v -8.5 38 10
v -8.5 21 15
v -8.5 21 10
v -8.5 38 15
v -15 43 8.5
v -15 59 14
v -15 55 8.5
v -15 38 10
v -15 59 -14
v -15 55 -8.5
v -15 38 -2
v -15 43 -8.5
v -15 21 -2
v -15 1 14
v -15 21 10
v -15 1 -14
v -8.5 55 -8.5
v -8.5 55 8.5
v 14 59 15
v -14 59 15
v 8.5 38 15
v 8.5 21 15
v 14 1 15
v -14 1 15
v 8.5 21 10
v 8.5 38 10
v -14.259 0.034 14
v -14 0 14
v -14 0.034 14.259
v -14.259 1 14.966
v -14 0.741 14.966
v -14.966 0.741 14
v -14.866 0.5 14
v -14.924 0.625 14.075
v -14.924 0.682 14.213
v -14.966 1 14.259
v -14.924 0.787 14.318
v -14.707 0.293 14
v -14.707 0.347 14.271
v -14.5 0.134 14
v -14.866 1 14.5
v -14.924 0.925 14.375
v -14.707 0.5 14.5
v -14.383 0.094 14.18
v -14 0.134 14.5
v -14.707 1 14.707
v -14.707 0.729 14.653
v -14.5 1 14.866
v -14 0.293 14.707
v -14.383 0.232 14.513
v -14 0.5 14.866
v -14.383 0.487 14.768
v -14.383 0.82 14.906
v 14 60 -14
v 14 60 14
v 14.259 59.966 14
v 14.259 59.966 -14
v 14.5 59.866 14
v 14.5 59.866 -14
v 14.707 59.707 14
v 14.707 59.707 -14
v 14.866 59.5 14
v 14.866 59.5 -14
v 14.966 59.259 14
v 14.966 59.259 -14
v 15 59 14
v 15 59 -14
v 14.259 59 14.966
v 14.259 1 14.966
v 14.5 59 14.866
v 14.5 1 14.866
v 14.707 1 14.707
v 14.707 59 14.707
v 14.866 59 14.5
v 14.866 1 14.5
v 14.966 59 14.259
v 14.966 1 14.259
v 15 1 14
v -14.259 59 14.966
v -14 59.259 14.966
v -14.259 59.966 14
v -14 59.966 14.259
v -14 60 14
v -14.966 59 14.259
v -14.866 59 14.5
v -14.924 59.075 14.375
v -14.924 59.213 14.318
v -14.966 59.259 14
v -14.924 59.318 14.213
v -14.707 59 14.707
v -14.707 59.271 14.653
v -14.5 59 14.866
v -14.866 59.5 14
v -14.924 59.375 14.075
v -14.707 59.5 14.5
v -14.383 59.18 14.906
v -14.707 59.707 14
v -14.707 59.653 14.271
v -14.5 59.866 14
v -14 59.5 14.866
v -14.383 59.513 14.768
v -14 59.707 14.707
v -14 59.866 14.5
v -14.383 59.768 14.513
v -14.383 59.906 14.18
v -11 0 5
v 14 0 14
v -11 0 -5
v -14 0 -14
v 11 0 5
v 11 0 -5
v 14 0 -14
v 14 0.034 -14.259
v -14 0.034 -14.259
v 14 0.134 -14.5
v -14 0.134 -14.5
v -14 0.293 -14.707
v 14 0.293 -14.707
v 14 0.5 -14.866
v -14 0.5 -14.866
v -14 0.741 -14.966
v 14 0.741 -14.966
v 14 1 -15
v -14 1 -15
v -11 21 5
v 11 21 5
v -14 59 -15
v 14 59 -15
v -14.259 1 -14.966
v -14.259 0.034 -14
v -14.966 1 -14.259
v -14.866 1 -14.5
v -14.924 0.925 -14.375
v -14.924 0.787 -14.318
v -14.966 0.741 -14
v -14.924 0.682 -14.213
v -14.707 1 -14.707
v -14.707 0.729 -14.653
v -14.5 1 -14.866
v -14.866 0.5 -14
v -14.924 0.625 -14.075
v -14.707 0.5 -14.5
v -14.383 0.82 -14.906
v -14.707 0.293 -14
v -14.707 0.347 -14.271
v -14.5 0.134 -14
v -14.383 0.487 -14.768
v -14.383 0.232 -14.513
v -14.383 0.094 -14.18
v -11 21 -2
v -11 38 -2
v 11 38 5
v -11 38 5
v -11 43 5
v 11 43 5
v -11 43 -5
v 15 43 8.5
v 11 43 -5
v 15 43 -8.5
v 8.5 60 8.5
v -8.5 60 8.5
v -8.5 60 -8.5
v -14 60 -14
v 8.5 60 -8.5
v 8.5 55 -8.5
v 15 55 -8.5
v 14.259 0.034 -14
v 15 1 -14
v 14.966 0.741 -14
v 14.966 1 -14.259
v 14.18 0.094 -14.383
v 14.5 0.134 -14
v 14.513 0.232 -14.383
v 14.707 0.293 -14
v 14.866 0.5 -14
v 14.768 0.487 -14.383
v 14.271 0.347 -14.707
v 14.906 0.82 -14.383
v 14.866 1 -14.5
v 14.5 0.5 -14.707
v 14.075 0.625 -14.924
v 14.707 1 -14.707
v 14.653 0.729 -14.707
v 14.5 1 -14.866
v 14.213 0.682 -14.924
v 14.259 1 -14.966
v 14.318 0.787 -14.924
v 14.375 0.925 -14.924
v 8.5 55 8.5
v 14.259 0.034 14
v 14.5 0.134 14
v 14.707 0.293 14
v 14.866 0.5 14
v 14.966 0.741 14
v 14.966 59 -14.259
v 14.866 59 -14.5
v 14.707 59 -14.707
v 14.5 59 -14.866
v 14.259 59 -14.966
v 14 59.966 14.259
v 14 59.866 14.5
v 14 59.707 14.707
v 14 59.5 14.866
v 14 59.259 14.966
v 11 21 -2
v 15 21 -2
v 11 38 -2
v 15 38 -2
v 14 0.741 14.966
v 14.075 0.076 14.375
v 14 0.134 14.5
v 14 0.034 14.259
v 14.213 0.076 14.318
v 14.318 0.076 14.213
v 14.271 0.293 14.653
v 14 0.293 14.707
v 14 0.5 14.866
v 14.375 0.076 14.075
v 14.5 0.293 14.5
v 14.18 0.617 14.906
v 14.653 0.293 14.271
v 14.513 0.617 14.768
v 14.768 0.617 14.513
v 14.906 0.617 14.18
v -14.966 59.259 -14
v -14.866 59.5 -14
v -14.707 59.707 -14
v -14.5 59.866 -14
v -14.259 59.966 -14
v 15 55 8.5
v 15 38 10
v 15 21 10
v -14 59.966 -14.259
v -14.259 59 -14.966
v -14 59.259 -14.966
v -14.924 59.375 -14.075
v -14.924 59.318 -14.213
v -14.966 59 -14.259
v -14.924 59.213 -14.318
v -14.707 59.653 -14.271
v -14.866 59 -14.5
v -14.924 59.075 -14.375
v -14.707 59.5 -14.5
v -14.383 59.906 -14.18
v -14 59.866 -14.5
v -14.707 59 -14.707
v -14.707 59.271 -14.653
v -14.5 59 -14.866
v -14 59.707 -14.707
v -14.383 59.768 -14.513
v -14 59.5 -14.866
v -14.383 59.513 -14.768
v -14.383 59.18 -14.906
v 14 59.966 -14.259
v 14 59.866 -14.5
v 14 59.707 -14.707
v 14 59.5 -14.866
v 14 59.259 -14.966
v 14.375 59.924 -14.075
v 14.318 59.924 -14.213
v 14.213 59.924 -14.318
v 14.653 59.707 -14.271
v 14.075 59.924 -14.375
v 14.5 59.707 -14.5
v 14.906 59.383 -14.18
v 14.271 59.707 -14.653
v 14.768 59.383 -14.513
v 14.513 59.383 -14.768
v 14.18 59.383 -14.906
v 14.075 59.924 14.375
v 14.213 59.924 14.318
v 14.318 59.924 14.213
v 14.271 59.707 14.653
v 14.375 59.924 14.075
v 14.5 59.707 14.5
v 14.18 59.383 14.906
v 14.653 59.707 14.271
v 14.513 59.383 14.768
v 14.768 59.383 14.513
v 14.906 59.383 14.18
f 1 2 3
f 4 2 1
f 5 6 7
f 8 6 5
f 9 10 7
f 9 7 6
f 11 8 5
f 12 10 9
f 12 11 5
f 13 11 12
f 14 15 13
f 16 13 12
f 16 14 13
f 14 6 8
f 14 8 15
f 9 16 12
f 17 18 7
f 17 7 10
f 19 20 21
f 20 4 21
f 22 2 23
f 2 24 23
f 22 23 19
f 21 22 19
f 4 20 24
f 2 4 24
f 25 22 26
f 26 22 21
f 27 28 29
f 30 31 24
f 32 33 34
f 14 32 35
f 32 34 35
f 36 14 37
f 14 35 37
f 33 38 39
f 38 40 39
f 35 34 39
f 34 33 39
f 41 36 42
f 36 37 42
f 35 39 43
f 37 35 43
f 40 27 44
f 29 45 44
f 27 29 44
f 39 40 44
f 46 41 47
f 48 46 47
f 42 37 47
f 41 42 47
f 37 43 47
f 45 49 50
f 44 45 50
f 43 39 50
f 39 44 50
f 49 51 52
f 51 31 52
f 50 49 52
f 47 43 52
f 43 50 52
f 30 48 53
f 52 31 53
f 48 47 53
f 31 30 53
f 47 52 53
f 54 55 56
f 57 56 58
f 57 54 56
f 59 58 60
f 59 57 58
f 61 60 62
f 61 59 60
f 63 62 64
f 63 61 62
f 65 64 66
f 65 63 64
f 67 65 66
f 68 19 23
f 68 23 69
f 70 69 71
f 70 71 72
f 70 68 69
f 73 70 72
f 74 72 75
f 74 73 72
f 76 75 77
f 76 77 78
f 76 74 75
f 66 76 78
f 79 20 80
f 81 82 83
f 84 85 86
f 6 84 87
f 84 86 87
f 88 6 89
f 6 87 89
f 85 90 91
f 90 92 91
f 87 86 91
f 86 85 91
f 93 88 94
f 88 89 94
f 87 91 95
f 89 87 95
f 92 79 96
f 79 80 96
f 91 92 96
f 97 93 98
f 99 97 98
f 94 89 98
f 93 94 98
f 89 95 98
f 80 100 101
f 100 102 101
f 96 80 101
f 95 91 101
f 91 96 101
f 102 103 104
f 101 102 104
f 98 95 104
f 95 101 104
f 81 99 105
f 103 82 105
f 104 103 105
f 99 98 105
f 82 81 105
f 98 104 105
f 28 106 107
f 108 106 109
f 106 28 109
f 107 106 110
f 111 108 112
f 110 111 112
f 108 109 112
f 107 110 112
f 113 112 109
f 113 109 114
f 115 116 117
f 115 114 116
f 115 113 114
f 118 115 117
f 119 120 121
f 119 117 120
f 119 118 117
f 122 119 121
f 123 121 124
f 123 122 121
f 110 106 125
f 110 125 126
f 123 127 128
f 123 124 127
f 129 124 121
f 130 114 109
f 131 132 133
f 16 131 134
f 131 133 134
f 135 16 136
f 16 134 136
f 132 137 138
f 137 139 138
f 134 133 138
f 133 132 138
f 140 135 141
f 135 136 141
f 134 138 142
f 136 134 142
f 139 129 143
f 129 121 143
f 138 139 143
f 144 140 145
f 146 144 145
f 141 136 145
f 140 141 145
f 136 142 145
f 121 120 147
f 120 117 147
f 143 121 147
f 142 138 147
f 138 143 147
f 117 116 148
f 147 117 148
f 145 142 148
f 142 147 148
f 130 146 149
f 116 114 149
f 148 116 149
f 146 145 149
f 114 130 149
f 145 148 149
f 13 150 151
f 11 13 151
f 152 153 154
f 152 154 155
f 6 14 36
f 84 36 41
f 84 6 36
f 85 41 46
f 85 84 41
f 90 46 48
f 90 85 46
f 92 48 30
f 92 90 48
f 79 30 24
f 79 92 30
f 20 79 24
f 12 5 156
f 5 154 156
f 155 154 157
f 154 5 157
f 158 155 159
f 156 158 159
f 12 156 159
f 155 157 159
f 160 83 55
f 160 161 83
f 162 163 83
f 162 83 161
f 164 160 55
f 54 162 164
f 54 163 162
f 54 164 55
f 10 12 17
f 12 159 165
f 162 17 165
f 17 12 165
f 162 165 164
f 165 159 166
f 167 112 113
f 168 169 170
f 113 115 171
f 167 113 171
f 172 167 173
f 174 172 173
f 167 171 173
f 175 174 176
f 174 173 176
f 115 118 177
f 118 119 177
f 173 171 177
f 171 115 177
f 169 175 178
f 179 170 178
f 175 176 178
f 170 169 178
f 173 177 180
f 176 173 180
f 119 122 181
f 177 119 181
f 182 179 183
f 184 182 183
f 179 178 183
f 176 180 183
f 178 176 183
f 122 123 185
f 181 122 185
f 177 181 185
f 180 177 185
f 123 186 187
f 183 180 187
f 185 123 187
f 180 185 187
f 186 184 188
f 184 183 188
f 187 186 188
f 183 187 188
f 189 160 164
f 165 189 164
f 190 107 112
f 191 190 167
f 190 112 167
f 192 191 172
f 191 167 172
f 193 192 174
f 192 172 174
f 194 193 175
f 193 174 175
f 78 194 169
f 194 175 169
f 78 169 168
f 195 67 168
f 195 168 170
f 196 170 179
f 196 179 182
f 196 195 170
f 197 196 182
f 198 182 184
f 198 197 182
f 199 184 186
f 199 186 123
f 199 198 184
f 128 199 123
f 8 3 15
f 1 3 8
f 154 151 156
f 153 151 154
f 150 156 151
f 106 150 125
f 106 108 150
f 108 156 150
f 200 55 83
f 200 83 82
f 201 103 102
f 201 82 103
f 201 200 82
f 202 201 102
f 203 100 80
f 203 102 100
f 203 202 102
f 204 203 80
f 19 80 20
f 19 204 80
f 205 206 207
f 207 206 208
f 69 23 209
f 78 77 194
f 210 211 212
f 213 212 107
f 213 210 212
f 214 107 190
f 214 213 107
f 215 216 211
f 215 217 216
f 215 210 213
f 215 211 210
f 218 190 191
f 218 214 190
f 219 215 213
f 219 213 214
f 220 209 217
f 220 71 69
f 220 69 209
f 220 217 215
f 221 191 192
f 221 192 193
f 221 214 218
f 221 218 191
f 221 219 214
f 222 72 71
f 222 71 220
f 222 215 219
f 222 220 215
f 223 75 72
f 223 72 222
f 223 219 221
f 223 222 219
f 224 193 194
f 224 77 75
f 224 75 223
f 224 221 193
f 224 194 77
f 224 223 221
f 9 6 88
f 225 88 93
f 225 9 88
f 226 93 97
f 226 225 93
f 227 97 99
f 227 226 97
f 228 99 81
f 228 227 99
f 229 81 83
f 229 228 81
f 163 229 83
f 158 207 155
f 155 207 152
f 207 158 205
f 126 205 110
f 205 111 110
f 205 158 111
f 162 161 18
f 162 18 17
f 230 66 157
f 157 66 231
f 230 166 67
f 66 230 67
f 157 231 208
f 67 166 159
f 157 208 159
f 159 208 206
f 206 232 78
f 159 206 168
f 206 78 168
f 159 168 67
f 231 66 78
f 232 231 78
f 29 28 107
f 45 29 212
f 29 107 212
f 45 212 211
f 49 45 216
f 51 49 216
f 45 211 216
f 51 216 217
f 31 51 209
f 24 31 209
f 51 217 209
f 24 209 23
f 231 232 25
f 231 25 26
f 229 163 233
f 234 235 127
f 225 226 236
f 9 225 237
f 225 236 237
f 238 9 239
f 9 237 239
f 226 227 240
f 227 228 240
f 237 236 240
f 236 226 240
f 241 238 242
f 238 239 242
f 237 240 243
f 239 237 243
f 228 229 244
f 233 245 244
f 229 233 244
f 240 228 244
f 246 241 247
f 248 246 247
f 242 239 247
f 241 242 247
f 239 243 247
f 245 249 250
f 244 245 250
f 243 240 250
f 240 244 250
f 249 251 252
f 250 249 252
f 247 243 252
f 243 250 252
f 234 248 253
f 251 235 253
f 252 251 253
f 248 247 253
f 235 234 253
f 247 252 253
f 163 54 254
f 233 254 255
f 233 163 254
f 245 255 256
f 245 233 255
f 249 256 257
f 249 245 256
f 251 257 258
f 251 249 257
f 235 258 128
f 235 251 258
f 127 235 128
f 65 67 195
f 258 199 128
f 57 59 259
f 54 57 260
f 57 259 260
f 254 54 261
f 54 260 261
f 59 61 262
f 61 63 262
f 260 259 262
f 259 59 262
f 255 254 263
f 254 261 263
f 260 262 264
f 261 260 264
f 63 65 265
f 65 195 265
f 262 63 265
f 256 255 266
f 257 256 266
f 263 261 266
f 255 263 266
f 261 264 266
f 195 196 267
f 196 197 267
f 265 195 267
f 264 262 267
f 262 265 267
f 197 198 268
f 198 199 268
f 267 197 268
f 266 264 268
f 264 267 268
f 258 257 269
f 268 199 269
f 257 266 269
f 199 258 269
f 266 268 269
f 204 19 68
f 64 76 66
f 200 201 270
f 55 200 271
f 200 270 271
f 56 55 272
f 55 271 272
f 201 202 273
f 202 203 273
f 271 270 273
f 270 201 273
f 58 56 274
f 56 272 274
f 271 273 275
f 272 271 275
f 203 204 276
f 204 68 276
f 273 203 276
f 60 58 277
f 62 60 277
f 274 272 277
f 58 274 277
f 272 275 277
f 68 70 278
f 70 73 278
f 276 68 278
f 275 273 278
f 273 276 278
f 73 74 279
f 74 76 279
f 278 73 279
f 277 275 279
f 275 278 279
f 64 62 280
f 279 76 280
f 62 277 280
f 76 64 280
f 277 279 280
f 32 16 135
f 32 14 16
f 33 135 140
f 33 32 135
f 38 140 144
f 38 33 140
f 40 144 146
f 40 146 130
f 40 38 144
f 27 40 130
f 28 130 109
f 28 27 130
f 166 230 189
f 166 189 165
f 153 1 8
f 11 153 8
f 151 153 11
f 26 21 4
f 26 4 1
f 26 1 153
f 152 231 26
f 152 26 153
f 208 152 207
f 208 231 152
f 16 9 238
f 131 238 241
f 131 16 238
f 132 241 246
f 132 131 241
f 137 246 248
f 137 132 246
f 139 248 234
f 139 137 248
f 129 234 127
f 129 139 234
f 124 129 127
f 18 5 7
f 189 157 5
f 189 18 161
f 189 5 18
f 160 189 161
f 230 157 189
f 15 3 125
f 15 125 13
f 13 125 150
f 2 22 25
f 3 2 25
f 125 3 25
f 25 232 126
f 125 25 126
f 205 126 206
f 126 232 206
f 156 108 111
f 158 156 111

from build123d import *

# Parameters (mm, degrees)
SKETCH_1_W          = 30
SKETCH_1_H          = 30
EXTRUDE_2_DEPTH     = 60
SKETCH_2_W          = 22
SKETCH_2_H          = 10
CUT_EXTRUDE_1_DEPTH = 47
SKETCH_3_W          = 17
SKETCH_3_H          = 12
CUT_EXTRUDE_2_DEPTH = 31
SKETCH_5_W          = 17
SKETCH_5_H          = 17
CUT_EXTRUDE_3_DEPTH = 5
SKETCH_6_W          = 12
SKETCH_6_H          = 17
CUT_EXTRUDE_4_DEPTH = 31
SKETCH_7_W          = 17
SKETCH_7_H          = 17
CUT_EXTRUDE_5_DEPTH = 5
FILLET_1_R          = 1
FILLET_2_R          = 1
FILLET_3_R          = 1
FILLET_4_R          = 1
FILLET_5_R          = 1


with BuildPart() as part:
    # ｽｹｯﾁ1 → ﾎﾞｽ - 押し出し2 (new body)
    with BuildSketch(Plane(origin=(0, 0, 0), x_dir=(1, 0, 0), z_dir=(0, 1, 0))):
        Rectangle(SKETCH_1_W, SKETCH_1_H)
    extrude(amount=EXTRUDE_2_DEPTH)

    # ｽｹｯﾁ2 → ｶｯﾄ - 押し出し1 (cut)
    with BuildSketch(Plane.XZ):
        Rectangle(SKETCH_2_W, SKETCH_2_H)
    extrude(amount=-CUT_EXTRUDE_1_DEPTH, mode=Mode.SUBTRACT)

    # ｽｹｯﾁ3 → ｶｯﾄ - 押し出し2 (cut, through all)
    with BuildSketch(Plane(origin=(15, 0, 0), x_dir=(0, 0, -1), z_dir=(1, 0, 0))):
        with Locations((0, 49)):
            Rectangle(SKETCH_3_W, SKETCH_3_H)
    extrude(amount=-CUT_EXTRUDE_2_DEPTH, mode=Mode.SUBTRACT)

    # ｽｹｯﾁ5 → ｶｯﾄ - 押し出し3 (cut)
    with BuildSketch(Plane(origin=(0, 60, 0), x_dir=(1, 0, 0), z_dir=(0, 1, 0))):
        Rectangle(SKETCH_5_W, SKETCH_5_H)
    extrude(amount=-CUT_EXTRUDE_3_DEPTH, mode=Mode.SUBTRACT)

    # ｽｹｯﾁ6 → ｶｯﾄ - 押し出し4 (cut, through all)
    with BuildSketch(Plane(origin=(15, 0, 0), x_dir=(0, 0, -1), z_dir=(1, 0, 0))):
        with Locations((-4, 29.5)):
            Rectangle(SKETCH_6_W, SKETCH_6_H)
    extrude(amount=-CUT_EXTRUDE_4_DEPTH, mode=Mode.SUBTRACT)

    # ｽｹｯﾁ7 → ｶｯﾄ - 押し出し5 (cut)
    with BuildSketch(Plane.XY.offset(15)):
        with Locations((0, 29.5)):
            Rectangle(SKETCH_7_W, SKETCH_7_H)
    extrude(amount=-CUT_EXTRUDE_5_DEPTH, mode=Mode.SUBTRACT)

    # ﾌｨﾚｯﾄ1
    fillet_1_edges = [part.edges().sort_by_distance(p)[0] for p in [
        (15, 30, 15),
    ]]
    fillet(fillet_1_edges, radius=FILLET_1_R)

    # ﾌｨﾚｯﾄ2
    fillet_2_edges = [part.edges().sort_by_distance(p)[0] for p in [
        (15, 0, -0.5),
        (14.707106781, 0, 14.707106781),
        (-0.5, 0, 15),
    ]]
    fillet(fillet_2_edges, radius=FILLET_2_R)

    # ﾌｨﾚｯﾄ3
    fillet_3_edges = [part.edges().sort_by_distance(p)[0] for p in [
        (-0.5, 0, -15),
        (14.707106781, 0.292893219, -15),
        (15, 30.5, -15),
    ]]
    fillet(fillet_3_edges, radius=FILLET_3_R)

    # ﾌｨﾚｯﾄ4
    fillet_4_edges = [part.edges().sort_by_distance(p)[0] for p in [
        (15, 60, 0),
        (14.707106781, 60, 14.707106781),
        (-0.5, 60, -15),
        (14.707106781, 60, -14.707106781),
        (-0.5, 60, 15),
    ]]
    fillet(fillet_4_edges, radius=FILLET_4_R)

    # ﾌｨﾚｯﾄ5
    fillet_5_edges = [part.edges().sort_by_distance(p)[0] for p in [
        (-15, 0.292893219, 14.707106781),
        (-15, 0, 0),
        (-15, 0.292893219, -14.707106781),
        (-15, 60, 0),
        (-15, 30, 15),
        (-15, 30, -15),
        (-15, 59.707106781, -14.707106781),
        (-15, 59.707106781, 14.707106781),
    ]]
    fillet(fillet_5_edges, radius=FILLET_5_R)


solid = part.part
